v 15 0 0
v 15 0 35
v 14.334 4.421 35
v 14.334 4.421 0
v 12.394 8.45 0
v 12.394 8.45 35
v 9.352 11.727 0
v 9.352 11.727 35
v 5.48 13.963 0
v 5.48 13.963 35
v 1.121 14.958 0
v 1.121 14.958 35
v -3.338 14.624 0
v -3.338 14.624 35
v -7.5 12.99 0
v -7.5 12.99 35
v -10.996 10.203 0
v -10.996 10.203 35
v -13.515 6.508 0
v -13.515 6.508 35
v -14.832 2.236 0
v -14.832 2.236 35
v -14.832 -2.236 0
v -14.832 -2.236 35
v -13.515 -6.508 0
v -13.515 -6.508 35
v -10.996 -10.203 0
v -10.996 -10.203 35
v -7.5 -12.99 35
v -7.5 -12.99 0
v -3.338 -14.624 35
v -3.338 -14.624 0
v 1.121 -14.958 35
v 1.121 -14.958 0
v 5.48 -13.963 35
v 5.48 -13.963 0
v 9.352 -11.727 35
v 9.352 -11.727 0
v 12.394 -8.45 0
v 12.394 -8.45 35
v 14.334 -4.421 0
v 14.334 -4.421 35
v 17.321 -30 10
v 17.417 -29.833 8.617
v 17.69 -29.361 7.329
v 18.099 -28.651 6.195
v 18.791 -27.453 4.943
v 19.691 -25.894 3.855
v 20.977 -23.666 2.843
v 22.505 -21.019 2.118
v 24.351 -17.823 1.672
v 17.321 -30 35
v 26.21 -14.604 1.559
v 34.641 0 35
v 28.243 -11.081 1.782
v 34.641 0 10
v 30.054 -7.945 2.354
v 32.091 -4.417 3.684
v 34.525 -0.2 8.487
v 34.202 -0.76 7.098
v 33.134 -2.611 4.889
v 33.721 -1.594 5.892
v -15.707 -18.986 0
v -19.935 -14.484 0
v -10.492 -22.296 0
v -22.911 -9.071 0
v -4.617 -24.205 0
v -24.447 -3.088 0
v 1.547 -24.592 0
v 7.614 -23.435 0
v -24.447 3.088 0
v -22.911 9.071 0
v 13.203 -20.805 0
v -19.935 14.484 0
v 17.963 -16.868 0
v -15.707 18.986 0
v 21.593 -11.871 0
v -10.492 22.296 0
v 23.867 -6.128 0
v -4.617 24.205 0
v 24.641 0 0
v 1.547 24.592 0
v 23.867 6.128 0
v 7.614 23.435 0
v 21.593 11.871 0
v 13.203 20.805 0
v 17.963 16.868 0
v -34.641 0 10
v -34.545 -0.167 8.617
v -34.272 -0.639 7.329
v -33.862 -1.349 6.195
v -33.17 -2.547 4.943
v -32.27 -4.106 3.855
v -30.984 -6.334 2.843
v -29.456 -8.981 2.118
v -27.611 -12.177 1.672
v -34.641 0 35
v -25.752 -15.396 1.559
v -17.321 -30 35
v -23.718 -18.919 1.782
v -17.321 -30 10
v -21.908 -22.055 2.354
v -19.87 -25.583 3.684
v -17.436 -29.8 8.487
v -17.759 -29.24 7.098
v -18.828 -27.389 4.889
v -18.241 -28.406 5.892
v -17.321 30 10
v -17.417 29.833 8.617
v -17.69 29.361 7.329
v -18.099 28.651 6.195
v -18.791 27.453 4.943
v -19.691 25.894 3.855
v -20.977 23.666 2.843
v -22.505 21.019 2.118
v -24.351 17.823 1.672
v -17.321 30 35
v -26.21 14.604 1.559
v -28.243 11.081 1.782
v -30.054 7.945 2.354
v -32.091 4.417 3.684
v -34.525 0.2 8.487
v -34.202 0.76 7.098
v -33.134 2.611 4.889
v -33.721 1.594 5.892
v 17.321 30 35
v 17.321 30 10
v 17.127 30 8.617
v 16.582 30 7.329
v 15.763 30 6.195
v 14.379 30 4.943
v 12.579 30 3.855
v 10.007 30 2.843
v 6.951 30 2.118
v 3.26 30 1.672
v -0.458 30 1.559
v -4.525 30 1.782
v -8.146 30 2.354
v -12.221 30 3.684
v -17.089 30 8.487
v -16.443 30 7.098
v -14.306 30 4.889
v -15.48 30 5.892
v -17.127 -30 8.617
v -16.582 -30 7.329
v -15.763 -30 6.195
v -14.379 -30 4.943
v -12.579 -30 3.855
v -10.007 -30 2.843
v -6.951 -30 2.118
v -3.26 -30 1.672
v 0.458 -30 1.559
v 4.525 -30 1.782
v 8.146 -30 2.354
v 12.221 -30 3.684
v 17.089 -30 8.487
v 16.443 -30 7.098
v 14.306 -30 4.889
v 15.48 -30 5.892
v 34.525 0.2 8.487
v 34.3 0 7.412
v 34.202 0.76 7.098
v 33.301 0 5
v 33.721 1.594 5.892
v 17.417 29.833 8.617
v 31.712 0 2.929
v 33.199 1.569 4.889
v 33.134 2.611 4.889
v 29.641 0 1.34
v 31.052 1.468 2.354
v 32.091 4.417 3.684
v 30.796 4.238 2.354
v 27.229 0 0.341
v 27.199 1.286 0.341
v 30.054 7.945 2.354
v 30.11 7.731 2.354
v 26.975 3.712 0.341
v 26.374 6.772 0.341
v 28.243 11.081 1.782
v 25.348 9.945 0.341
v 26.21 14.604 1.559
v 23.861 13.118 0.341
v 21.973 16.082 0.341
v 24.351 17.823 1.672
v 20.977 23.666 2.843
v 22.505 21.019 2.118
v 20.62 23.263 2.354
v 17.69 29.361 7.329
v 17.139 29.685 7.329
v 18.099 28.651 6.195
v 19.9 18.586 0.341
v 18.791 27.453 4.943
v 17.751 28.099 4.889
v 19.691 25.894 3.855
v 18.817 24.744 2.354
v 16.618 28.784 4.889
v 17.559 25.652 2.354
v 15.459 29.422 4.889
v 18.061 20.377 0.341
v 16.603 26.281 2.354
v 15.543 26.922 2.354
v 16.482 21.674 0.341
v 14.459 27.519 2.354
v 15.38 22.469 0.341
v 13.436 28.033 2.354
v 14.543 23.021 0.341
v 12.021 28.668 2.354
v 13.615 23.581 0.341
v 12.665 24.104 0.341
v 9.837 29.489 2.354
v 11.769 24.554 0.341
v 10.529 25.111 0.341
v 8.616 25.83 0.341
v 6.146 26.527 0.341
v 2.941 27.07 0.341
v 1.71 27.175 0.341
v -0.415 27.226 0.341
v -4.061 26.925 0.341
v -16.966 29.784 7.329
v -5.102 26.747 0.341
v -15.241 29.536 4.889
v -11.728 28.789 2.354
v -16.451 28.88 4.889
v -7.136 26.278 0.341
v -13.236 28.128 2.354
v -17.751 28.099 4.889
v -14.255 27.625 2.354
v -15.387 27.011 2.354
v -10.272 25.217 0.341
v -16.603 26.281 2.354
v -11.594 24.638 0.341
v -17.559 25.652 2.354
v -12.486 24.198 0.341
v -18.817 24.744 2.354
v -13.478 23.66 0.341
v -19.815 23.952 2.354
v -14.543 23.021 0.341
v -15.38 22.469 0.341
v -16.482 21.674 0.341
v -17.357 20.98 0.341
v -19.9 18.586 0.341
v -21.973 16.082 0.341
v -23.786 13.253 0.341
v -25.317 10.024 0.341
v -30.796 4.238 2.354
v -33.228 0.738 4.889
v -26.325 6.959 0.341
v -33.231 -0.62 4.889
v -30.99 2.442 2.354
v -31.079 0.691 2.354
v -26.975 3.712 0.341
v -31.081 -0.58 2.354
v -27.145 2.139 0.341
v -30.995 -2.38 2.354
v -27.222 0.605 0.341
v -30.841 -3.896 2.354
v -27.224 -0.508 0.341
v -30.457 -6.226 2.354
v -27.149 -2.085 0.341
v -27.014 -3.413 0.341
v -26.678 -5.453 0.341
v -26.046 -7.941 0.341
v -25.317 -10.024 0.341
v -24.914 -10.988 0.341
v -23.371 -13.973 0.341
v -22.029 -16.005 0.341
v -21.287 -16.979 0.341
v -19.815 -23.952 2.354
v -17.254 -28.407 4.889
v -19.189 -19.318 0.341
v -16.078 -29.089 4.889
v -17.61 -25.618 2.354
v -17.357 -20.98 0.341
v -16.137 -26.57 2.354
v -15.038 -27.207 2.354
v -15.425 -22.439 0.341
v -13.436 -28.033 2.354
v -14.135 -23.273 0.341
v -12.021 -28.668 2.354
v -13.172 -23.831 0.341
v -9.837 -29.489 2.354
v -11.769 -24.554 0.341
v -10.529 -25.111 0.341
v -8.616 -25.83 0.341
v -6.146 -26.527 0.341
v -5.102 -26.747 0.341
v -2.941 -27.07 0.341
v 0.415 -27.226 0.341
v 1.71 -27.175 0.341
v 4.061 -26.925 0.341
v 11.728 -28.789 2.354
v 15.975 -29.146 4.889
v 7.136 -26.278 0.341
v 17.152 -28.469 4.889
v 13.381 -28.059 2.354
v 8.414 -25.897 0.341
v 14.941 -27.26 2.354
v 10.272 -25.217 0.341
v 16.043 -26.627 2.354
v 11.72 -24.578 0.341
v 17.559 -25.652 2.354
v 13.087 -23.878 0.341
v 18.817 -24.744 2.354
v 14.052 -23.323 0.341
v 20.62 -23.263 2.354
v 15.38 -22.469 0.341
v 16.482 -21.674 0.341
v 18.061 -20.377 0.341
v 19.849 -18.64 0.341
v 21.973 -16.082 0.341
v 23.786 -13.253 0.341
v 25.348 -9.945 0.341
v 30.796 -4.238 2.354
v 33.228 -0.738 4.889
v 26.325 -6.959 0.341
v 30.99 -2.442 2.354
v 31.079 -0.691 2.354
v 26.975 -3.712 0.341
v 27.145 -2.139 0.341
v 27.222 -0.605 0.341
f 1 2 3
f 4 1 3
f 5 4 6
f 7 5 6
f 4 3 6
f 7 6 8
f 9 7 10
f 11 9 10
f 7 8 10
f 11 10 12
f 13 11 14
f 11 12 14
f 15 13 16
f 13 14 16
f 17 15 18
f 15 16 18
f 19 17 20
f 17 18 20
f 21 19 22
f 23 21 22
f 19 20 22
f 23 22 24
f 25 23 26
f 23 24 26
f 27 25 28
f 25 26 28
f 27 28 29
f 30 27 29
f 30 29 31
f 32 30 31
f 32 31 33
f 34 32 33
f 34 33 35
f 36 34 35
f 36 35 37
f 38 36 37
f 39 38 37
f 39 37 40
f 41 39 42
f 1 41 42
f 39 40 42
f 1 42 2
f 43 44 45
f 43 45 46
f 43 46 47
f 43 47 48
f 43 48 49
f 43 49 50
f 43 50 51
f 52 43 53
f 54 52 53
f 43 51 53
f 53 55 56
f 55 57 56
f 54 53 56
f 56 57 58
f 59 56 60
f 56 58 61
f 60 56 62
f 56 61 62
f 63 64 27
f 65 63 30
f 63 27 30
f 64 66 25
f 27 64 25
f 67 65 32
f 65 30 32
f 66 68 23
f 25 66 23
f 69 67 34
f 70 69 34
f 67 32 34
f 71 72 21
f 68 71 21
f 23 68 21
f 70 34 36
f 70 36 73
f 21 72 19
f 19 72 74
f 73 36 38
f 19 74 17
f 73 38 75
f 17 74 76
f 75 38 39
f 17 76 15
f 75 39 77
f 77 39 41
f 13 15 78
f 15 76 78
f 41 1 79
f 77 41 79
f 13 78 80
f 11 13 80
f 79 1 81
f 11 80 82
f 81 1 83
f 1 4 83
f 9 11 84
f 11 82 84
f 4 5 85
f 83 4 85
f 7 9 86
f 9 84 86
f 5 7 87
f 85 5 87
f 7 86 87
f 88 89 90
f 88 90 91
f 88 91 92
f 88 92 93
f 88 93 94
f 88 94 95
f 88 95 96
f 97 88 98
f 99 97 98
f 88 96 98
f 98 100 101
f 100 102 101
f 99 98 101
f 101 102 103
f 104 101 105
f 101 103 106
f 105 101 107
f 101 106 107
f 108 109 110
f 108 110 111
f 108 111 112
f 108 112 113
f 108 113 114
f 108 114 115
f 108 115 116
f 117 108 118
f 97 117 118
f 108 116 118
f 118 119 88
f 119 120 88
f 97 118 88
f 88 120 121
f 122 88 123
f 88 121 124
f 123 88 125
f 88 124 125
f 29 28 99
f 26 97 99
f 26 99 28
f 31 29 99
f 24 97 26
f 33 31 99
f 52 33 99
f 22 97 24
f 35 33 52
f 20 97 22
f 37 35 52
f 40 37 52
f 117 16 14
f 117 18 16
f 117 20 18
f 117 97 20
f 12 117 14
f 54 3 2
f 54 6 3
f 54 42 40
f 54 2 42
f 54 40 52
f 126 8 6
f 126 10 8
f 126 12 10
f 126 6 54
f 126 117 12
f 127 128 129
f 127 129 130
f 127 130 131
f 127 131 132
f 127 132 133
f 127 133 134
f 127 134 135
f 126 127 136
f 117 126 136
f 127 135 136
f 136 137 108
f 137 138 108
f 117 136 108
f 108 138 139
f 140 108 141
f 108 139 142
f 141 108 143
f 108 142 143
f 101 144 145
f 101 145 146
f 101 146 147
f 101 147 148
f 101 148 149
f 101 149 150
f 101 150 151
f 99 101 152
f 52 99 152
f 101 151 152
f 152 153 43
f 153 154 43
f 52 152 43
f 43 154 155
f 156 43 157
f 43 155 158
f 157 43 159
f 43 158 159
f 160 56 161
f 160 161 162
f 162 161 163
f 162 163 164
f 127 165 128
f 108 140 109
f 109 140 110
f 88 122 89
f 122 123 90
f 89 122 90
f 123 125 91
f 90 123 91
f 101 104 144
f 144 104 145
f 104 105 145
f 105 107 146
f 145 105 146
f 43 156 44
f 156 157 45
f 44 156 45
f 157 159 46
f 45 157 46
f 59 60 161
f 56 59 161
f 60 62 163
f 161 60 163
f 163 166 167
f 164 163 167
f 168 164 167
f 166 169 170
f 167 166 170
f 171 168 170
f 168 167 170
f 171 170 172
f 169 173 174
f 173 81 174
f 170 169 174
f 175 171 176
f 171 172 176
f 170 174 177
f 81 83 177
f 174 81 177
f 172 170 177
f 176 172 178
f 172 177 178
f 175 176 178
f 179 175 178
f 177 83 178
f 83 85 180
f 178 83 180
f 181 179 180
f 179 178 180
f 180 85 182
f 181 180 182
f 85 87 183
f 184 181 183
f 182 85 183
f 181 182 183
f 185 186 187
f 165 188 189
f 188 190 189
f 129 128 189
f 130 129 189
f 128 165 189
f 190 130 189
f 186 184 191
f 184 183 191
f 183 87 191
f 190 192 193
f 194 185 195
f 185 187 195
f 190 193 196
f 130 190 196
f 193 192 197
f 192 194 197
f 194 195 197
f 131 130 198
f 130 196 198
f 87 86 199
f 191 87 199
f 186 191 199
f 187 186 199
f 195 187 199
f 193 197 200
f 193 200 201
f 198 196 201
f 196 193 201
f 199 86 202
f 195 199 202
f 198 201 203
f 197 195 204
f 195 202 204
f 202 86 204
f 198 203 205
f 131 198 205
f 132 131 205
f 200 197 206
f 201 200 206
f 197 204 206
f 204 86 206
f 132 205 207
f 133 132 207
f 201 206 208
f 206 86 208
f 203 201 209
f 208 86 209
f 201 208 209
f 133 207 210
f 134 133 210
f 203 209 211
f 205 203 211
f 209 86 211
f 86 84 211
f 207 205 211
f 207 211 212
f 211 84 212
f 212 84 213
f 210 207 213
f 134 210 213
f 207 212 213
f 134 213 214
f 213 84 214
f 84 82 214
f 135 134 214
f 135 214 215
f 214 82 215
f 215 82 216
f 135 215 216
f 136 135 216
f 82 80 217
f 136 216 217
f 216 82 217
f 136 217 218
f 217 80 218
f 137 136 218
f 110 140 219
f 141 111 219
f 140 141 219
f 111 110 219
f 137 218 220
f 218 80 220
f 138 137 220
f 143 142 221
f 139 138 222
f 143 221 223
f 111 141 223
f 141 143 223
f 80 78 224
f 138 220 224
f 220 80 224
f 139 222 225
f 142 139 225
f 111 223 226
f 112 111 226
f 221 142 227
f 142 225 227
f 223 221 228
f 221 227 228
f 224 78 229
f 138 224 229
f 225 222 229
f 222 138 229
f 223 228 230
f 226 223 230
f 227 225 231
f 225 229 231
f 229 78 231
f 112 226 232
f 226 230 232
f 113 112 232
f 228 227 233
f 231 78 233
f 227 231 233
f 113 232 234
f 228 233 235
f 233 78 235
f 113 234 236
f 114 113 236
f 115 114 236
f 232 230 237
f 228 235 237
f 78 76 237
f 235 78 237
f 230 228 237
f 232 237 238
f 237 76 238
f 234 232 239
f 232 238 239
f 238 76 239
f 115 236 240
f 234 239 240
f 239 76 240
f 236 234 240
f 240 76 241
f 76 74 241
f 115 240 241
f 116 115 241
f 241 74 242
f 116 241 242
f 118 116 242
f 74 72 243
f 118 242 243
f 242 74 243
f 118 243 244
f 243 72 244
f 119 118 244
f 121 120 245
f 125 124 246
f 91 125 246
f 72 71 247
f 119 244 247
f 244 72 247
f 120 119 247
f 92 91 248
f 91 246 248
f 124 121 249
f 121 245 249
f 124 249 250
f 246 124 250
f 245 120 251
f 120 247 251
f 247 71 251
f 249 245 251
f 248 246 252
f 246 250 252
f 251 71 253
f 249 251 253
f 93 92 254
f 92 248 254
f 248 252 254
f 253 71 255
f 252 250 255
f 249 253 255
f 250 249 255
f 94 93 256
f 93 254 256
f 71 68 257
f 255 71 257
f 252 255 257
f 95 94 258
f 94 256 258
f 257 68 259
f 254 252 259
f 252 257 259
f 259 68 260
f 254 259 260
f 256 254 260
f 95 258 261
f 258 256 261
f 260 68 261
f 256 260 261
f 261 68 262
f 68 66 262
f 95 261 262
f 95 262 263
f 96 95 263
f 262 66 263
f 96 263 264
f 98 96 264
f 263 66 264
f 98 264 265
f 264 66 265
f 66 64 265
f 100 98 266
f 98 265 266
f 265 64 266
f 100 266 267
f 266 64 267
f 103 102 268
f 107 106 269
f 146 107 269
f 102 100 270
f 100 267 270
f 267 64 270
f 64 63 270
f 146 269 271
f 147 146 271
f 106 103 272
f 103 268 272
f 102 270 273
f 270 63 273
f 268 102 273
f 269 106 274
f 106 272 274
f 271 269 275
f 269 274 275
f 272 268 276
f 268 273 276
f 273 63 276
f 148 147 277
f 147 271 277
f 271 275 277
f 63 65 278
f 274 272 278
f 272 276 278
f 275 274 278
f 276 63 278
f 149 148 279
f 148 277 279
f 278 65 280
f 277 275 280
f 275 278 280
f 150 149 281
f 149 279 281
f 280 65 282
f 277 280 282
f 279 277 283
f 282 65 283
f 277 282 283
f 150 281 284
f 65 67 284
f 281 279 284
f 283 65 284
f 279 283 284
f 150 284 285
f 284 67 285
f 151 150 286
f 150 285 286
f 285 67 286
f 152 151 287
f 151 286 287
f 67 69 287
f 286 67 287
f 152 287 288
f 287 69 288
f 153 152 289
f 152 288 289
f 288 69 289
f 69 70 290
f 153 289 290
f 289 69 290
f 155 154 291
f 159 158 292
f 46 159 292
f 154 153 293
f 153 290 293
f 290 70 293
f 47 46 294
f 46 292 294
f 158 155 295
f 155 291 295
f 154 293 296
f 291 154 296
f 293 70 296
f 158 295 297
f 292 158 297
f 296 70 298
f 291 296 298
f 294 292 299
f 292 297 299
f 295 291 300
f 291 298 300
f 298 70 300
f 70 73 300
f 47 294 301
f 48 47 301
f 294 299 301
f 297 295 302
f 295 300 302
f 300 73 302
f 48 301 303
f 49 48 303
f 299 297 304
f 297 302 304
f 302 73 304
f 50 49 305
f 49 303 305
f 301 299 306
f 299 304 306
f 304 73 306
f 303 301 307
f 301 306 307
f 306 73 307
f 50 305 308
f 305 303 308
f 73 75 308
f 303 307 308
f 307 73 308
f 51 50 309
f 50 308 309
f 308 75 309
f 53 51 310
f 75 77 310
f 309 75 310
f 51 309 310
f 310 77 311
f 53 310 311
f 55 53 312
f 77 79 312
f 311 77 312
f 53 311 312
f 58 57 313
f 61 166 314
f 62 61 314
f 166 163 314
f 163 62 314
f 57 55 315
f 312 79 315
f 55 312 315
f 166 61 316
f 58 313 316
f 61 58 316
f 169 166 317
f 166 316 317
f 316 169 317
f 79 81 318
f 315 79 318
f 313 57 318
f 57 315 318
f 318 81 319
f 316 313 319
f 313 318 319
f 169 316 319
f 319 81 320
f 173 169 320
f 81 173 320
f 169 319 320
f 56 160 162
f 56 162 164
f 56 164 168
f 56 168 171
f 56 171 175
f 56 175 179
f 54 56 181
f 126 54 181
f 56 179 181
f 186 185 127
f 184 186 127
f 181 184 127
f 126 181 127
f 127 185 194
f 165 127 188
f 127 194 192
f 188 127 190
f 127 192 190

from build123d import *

# Parameters (mm, degrees)
BOSS_EXTRUDE1_DEPTH = 35
SKETCH2_R           = 15
CUT_EXTRUDE1_DEPTH  = 35


with BuildPart() as part:
    # Sketch1 → Boss-Extrude1 (new body)
    with BuildSketch(Plane.XY):
        Polygon((-34.641016151, 0), (-17.320508076, -30), (17.320508076, -30), (34.641016151, 0), (17.320508076, 30), (-17.320508076, 30), align=None)
    extrude(amount=BOSS_EXTRUDE1_DEPTH)

    # Sketch2 → Cut-Extrude1 (cut)
    with BuildSketch(Plane.XY.offset(35)):
        Circle(SKETCH2_R)
    extrude(amount=-CUT_EXTRUDE1_DEPTH, mode=Mode.SUBTRACT)

    # Sketch3 → Cut-Revolve1 (revolve, cut)
    with BuildSketch(Plane(origin=(0, 0, 0), x_dir=(1, 0, 0), z_dir=(0, 1, 0))):
        with BuildLine():
            Line((24.641016151, 0), (34.641016151, 0))
            Line((34.641016151, 0), (34.641016151, -10))
            ThreePointArc((34.641016151, -10), (31.712083963, -2.928932188), (24.641016151, 0))
        make_face()
    revolve(axis=Axis((0, 0, 0), (0, 0, 1)), mode=Mode.SUBTRACT)


solid = part.part
